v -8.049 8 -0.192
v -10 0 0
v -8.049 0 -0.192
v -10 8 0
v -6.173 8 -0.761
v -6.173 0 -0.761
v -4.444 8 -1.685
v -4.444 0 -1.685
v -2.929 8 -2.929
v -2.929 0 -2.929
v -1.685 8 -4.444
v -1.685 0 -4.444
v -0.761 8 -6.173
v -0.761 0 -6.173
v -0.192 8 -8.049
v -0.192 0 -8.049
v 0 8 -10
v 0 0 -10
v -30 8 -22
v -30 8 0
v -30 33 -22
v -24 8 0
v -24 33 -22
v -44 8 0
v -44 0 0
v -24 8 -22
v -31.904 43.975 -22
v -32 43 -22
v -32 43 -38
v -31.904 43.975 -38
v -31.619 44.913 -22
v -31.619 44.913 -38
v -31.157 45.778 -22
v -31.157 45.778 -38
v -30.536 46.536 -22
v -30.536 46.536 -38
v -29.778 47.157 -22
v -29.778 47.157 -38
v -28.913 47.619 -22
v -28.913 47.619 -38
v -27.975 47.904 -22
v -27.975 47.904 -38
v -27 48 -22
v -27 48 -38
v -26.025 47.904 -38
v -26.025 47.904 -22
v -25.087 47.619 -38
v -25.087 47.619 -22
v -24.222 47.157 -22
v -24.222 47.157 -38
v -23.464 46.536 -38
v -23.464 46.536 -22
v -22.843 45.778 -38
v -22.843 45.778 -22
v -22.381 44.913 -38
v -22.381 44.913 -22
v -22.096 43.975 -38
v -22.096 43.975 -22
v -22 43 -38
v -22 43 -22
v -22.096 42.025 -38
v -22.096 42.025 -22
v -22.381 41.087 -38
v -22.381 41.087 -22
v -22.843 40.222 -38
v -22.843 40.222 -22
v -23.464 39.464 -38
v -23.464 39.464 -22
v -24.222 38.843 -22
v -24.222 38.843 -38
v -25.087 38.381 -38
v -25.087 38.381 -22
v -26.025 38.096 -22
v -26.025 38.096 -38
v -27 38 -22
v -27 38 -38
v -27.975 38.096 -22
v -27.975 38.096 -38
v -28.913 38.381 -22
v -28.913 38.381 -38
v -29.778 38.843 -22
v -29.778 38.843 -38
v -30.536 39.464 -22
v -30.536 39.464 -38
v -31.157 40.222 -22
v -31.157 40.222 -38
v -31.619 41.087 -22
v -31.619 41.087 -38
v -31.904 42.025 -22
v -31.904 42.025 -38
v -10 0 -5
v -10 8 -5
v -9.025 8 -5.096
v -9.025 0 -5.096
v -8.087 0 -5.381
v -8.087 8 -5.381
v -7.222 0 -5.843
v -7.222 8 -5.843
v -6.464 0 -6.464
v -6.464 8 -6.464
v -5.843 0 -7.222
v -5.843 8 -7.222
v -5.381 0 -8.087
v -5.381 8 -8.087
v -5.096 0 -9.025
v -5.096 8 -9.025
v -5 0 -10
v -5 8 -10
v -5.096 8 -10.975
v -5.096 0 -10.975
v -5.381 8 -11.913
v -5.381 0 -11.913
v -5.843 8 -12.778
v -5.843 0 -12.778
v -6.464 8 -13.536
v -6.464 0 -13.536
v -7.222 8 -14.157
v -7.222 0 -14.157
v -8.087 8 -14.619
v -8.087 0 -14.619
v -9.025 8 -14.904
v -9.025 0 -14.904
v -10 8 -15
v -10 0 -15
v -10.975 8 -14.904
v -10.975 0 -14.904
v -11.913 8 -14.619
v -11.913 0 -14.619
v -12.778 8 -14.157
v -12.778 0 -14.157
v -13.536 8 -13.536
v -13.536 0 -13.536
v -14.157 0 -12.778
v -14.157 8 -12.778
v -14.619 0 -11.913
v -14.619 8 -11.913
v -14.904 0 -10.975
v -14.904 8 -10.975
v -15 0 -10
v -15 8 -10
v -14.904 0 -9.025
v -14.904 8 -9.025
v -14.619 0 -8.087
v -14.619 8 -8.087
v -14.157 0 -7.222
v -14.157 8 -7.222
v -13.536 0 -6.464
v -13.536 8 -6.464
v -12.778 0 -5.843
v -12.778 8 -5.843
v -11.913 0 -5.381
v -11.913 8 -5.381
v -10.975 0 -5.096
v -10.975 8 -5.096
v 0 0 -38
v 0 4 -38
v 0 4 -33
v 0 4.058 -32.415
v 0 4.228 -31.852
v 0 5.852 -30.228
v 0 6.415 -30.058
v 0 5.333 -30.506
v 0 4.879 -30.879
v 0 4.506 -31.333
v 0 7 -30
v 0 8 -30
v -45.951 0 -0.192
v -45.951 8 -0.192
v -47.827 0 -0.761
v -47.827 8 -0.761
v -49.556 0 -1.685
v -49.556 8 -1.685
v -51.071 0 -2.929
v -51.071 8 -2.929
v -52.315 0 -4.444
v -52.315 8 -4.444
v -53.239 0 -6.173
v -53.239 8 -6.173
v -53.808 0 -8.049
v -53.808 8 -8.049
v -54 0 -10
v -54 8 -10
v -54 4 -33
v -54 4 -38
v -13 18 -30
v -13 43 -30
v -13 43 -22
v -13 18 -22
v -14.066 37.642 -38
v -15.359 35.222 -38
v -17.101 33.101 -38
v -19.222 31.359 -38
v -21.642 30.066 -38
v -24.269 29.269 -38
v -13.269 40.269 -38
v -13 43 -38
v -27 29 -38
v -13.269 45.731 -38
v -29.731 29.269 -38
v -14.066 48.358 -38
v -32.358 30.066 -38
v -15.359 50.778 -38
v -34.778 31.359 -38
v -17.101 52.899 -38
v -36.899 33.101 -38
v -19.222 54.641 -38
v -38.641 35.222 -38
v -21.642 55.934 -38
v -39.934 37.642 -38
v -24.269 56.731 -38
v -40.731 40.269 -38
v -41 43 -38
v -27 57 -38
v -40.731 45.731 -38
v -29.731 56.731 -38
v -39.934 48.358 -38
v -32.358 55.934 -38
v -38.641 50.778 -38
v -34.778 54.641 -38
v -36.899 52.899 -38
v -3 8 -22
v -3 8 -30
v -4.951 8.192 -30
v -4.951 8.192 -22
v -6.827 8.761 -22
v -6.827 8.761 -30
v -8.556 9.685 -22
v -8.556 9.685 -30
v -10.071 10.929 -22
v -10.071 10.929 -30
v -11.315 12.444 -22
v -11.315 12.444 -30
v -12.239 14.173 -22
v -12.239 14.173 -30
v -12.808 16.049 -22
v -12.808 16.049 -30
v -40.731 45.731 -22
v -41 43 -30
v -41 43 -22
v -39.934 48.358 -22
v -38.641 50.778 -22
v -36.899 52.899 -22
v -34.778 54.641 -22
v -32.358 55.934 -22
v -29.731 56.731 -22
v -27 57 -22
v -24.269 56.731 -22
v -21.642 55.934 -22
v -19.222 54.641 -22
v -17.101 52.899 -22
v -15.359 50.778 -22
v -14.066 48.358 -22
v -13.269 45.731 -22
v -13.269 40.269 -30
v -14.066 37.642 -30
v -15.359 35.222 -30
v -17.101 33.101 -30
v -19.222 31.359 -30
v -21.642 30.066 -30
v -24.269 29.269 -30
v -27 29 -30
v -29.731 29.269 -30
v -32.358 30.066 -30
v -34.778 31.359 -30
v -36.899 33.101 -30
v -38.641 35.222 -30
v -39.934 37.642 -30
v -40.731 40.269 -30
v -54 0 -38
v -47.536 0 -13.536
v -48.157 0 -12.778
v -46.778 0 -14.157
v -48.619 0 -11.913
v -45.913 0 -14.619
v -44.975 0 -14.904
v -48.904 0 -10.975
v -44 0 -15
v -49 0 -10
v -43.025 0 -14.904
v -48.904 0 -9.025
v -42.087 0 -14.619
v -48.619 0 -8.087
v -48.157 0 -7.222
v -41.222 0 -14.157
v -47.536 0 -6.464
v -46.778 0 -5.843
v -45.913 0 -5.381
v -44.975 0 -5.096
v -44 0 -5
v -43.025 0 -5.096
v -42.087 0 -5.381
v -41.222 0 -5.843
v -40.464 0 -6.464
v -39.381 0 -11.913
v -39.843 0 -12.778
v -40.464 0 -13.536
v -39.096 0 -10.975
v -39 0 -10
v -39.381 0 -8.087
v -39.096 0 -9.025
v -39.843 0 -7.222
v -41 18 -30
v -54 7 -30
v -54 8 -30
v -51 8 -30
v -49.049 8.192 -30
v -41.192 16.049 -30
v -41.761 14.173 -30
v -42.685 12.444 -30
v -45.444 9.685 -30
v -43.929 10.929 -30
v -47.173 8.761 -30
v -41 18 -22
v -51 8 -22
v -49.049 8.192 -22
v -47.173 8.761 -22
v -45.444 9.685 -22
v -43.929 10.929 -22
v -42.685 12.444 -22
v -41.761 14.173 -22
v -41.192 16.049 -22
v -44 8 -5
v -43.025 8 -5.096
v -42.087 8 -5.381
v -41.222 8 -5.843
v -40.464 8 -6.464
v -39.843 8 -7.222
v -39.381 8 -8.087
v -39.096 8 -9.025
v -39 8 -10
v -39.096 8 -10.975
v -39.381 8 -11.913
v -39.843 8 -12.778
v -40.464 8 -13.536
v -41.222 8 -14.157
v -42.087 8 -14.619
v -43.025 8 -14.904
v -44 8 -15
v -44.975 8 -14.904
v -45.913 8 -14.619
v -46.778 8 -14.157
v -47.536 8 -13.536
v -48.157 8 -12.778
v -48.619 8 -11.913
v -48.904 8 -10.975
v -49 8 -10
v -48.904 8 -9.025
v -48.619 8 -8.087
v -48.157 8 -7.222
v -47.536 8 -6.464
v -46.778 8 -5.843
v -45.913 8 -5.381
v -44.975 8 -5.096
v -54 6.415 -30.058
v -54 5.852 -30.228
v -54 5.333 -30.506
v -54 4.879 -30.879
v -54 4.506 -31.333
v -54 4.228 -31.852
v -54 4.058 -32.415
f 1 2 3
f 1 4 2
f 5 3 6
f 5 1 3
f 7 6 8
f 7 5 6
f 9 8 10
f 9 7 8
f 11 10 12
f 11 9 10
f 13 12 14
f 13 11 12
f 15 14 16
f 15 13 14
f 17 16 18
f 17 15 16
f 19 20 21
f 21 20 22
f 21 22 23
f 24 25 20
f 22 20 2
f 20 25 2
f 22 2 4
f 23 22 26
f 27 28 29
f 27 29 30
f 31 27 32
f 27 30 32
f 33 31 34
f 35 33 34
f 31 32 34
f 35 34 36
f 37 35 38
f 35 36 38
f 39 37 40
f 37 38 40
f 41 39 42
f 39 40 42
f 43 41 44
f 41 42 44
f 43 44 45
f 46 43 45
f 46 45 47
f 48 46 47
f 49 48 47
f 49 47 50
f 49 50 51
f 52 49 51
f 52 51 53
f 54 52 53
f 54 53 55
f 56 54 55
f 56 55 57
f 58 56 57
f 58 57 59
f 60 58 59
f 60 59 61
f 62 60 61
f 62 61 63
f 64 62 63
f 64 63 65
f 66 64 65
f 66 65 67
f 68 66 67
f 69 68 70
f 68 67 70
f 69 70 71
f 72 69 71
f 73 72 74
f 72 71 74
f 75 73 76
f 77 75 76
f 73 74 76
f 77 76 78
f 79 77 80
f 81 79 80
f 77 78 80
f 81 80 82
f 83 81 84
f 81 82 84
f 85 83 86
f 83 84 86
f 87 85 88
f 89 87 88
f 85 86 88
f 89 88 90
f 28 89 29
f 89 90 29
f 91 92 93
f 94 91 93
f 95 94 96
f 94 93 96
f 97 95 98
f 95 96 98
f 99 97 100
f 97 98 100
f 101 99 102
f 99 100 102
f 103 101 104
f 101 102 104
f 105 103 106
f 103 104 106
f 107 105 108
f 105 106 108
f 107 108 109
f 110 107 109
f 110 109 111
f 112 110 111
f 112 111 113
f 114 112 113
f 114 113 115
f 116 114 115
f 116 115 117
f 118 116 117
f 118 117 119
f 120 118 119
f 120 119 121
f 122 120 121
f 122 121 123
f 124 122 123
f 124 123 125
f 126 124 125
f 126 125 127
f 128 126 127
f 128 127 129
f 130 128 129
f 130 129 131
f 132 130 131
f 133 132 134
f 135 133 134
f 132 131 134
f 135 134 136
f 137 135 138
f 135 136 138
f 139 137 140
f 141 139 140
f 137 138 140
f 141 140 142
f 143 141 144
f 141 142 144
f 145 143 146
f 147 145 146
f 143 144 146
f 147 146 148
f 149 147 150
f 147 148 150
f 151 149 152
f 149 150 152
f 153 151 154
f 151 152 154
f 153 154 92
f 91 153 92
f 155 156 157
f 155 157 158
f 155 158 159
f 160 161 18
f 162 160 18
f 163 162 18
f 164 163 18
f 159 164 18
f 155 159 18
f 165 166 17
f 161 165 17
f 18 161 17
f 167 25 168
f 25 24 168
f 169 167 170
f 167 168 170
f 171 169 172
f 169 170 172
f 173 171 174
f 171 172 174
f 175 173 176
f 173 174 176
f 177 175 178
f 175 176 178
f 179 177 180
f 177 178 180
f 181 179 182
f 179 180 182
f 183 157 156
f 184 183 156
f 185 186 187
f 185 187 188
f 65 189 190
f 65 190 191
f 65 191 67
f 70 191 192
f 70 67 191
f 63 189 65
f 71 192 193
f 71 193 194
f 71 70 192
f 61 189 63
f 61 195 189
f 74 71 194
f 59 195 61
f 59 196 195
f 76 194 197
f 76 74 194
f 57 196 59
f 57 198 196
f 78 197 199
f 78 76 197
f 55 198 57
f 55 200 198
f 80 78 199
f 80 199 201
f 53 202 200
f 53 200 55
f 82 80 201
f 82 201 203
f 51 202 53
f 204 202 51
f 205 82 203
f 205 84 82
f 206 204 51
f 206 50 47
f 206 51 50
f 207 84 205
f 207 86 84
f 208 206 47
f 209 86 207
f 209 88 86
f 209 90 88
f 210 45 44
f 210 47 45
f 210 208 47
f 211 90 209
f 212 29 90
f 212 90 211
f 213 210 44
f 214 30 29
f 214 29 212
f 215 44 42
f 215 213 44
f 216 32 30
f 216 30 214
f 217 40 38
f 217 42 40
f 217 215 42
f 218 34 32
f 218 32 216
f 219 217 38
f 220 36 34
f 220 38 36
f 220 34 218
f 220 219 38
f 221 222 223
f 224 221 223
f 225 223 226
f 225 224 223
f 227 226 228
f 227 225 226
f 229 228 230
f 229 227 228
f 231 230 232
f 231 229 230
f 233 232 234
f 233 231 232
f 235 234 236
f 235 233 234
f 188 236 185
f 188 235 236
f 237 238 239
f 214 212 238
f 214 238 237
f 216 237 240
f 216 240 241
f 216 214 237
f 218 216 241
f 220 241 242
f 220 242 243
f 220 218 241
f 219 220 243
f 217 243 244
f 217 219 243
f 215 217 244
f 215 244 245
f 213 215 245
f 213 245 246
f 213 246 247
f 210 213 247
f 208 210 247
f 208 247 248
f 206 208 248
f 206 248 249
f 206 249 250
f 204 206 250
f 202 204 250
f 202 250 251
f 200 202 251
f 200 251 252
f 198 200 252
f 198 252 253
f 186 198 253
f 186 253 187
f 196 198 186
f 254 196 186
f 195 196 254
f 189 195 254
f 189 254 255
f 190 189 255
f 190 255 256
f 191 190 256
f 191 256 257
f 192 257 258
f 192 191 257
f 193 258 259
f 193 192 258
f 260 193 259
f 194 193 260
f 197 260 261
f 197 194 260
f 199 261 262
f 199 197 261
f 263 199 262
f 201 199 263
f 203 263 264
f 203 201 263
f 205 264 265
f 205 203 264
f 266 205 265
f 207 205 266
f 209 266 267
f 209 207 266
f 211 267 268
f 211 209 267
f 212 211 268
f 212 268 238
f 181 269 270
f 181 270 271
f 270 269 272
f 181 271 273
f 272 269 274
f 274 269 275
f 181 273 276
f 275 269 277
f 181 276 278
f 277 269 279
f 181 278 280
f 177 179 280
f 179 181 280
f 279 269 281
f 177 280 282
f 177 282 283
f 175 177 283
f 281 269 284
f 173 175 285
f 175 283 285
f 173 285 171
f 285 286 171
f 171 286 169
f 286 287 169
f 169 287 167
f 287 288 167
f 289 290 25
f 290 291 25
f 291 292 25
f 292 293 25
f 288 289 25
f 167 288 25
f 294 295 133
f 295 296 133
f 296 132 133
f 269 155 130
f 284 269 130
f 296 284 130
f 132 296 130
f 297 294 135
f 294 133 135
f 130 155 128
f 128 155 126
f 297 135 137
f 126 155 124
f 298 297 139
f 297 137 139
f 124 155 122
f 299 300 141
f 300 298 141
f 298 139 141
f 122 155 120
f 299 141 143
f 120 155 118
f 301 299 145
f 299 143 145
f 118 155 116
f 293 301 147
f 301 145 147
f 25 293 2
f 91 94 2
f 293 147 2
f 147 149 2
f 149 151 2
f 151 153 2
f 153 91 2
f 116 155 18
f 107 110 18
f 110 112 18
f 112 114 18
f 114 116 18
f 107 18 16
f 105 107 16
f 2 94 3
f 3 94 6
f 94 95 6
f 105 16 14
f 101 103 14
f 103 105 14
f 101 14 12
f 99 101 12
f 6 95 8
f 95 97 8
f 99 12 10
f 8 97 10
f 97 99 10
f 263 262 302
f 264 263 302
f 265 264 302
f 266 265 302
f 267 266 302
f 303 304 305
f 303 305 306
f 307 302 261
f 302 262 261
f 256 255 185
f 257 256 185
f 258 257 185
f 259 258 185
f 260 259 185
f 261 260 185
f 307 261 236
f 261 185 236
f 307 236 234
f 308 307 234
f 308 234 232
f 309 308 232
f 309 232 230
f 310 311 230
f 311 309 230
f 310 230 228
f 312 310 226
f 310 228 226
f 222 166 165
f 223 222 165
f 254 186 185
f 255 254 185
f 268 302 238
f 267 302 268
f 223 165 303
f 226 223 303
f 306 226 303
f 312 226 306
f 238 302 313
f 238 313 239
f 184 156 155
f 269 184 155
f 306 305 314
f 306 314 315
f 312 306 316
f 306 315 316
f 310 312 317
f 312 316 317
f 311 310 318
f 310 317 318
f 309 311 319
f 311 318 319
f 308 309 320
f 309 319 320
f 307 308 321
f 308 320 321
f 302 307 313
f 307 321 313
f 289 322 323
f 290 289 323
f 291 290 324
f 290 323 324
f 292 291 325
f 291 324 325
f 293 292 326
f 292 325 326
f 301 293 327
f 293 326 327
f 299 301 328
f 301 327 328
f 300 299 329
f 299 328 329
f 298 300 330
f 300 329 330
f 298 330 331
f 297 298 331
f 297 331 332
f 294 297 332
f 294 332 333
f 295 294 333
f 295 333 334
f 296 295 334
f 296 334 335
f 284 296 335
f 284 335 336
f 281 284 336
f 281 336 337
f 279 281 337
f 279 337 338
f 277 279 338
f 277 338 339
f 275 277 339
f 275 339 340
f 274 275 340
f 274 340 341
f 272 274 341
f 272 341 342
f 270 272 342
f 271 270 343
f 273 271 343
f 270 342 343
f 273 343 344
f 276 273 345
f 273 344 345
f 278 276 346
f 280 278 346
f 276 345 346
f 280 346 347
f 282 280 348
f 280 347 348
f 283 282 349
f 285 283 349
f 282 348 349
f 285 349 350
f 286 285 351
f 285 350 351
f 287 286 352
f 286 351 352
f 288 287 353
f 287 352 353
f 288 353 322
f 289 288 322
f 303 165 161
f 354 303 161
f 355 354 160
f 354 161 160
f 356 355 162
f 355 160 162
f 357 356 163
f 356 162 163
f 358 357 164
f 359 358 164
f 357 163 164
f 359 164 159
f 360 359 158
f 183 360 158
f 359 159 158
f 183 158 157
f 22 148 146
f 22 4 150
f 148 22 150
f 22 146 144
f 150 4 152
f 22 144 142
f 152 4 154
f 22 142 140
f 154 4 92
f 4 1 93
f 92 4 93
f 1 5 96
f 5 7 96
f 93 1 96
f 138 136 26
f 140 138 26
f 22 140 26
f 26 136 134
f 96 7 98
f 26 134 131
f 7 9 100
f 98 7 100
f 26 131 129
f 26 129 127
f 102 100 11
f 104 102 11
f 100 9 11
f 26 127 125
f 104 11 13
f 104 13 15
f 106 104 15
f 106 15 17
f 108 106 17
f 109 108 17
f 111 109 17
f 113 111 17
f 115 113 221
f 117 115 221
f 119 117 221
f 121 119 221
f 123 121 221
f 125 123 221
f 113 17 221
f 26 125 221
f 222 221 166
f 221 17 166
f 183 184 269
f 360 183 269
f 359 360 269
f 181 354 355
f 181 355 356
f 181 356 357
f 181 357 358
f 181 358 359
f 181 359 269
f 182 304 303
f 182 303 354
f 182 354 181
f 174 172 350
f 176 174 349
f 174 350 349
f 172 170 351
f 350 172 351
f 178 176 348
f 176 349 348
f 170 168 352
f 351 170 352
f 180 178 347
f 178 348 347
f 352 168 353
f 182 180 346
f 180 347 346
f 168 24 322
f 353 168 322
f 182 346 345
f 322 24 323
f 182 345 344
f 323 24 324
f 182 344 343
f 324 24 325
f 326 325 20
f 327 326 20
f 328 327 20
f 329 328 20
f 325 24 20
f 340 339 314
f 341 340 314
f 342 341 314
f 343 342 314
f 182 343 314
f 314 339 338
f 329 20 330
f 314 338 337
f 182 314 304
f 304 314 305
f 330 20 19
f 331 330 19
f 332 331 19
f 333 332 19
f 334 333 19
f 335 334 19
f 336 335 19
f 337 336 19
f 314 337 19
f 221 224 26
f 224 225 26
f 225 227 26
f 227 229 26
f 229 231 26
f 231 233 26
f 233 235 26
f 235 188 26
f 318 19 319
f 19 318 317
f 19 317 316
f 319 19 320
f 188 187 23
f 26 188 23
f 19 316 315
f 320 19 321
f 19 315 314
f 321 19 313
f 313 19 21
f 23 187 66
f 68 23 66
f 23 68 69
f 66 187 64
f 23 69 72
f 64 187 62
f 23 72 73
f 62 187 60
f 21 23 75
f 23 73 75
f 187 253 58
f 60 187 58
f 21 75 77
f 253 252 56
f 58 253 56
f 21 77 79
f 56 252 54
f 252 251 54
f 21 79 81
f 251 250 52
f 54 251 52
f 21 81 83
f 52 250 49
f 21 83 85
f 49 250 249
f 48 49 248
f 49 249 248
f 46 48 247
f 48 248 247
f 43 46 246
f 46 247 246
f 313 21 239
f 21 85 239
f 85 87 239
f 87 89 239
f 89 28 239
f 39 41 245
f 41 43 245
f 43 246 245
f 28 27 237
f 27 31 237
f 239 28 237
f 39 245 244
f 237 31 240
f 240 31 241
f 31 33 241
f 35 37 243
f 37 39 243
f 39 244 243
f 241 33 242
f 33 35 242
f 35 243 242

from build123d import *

# Parameters (mm, degrees)
BOSS_EXTRUDE1_DEPTH = 54
FILLET1_R           = 10
SKETCH2_R           = 5
CUT_EXTRUDE1_DEPTH  = 67.513156593
BOSS_EXTRUDE2_DEPTH = 8
FILLET2_R           = 10
BOSS_EXTRUDE3_START = 8
SKETCH4_R           = 14
BOSS_EXTRUDE3_DEPTH = 8
SKETCH5_R           = 5
CUT_EXTRUDE2_DEPTH  = 88.229582138
RIB1_REACH          = 75.634
SKETCH6_WALL_W      = 182.57011395
SKETCH6_WALL_H      = 6


with BuildPart() as part:
    # Sketch1 → Boss-Extrude1 (new body)
    with BuildSketch(Plane(origin=(0, 0, 0), x_dir=(0, 0, -1), z_dir=(1, 0, 0))):
        with BuildLine():
            Line((30, 8), (30, 7))
            ThreePointArc((30, 7), (30.878679656, 4.878679656), (33, 4))
            Line((33, 4), (38, 4))
            Line((38, 4), (38, 0))
            Line((38, 0), (0, 0))
            Line((0, 0), (0, 8))
            Line((0, 8), (30, 8))
        make_face()
    extrude(amount=-BOSS_EXTRUDE1_DEPTH)

    # Fillet1
    fillet1_edges = [part.edges().sort_by_distance(p)[0] for p in [
        (0, 4, 0),
        (-54, 4, 0),
    ]]
    fillet(fillet1_edges, radius=FILLET1_R)

    # Sketch2 → Cut-Extrude1 (cut, through all)
    with BuildSketch(Plane(origin=(0, 8, 0), x_dir=(1, 0, 0), z_dir=(0, 1, 0))):
        with Locations(Location((-44, 10, 0), (0, 0, 270))):
            Circle(SKETCH2_R)
        with Locations(Location((-10, 10, 0), (0, 0, 270))):
            Circle(SKETCH2_R)
    extrude(amount=-CUT_EXTRUDE1_DEPTH, mode=Mode.SUBTRACT)

    # Sketch3 → Boss-Extrude2 (add)
    with BuildSketch(Plane(origin=(0, 0, -30), x_dir=(-1, 0, 0), z_dir=(0, 0, -1))):
        with BuildLine():
            Line((13, 8), (41, 8))
            Line((41, 8), (41, 43))
            ThreePointArc((41, 43), (27, 57), (13, 43))
            Line((13, 43), (13, 8))
        make_face()
    extrude(amount=-BOSS_EXTRUDE2_DEPTH)

    # Fillet2
    fillet2_edges = [part.edges().sort_by_distance(p)[0] for p in [
        (-41, 8, -26),
        (-13, 8, -26),
    ]]
    fillet(fillet2_edges, radius=FILLET2_R)

    # Sketch4 → Boss-Extrude3 (add)
    with BuildSketch(Plane(origin=(0, 0, -30), x_dir=(-1, 0, 0), z_dir=(0, 0, -1)).offset(BOSS_EXTRUDE3_START)):
        with Locations((27, 43)):
            Circle(SKETCH4_R)
    extrude(amount=-BOSS_EXTRUDE3_DEPTH)

    # Sketch5 → Cut-Extrude2 (cut, through all)
    with BuildSketch(Plane(origin=(0, 0, -38), x_dir=(-1, 0, 0), z_dir=(0, 0, -1))):
        with Locations((27, 43)):
            Circle(SKETCH5_R)
    extrude(amount=-CUT_EXTRUDE2_DEPTH, mode=Mode.SUBTRACT)

    # Sketch6 wall → Rib1 (add, up to next)
    with BuildSketch(Plane(origin=(-27, 20.5, -11), x_dir=(0, 0.750713516923, -0.660627894892), z_dir=(0, 0.660627894892, 0.750713516923)), mode=Mode.PRIVATE) as rib1_sk1:
        Rectangle(SKETCH6_WALL_W, SKETCH6_WALL_H)
    rib1_tool1 = extrude(rib1_sk1.sketch, amount=-RIB1_REACH, mode=Mode.PRIVATE) - part.part
    add(rib1_tool1.solids().sort_by_distance((-27, 20.5, -11))[0])


solid = part.part
